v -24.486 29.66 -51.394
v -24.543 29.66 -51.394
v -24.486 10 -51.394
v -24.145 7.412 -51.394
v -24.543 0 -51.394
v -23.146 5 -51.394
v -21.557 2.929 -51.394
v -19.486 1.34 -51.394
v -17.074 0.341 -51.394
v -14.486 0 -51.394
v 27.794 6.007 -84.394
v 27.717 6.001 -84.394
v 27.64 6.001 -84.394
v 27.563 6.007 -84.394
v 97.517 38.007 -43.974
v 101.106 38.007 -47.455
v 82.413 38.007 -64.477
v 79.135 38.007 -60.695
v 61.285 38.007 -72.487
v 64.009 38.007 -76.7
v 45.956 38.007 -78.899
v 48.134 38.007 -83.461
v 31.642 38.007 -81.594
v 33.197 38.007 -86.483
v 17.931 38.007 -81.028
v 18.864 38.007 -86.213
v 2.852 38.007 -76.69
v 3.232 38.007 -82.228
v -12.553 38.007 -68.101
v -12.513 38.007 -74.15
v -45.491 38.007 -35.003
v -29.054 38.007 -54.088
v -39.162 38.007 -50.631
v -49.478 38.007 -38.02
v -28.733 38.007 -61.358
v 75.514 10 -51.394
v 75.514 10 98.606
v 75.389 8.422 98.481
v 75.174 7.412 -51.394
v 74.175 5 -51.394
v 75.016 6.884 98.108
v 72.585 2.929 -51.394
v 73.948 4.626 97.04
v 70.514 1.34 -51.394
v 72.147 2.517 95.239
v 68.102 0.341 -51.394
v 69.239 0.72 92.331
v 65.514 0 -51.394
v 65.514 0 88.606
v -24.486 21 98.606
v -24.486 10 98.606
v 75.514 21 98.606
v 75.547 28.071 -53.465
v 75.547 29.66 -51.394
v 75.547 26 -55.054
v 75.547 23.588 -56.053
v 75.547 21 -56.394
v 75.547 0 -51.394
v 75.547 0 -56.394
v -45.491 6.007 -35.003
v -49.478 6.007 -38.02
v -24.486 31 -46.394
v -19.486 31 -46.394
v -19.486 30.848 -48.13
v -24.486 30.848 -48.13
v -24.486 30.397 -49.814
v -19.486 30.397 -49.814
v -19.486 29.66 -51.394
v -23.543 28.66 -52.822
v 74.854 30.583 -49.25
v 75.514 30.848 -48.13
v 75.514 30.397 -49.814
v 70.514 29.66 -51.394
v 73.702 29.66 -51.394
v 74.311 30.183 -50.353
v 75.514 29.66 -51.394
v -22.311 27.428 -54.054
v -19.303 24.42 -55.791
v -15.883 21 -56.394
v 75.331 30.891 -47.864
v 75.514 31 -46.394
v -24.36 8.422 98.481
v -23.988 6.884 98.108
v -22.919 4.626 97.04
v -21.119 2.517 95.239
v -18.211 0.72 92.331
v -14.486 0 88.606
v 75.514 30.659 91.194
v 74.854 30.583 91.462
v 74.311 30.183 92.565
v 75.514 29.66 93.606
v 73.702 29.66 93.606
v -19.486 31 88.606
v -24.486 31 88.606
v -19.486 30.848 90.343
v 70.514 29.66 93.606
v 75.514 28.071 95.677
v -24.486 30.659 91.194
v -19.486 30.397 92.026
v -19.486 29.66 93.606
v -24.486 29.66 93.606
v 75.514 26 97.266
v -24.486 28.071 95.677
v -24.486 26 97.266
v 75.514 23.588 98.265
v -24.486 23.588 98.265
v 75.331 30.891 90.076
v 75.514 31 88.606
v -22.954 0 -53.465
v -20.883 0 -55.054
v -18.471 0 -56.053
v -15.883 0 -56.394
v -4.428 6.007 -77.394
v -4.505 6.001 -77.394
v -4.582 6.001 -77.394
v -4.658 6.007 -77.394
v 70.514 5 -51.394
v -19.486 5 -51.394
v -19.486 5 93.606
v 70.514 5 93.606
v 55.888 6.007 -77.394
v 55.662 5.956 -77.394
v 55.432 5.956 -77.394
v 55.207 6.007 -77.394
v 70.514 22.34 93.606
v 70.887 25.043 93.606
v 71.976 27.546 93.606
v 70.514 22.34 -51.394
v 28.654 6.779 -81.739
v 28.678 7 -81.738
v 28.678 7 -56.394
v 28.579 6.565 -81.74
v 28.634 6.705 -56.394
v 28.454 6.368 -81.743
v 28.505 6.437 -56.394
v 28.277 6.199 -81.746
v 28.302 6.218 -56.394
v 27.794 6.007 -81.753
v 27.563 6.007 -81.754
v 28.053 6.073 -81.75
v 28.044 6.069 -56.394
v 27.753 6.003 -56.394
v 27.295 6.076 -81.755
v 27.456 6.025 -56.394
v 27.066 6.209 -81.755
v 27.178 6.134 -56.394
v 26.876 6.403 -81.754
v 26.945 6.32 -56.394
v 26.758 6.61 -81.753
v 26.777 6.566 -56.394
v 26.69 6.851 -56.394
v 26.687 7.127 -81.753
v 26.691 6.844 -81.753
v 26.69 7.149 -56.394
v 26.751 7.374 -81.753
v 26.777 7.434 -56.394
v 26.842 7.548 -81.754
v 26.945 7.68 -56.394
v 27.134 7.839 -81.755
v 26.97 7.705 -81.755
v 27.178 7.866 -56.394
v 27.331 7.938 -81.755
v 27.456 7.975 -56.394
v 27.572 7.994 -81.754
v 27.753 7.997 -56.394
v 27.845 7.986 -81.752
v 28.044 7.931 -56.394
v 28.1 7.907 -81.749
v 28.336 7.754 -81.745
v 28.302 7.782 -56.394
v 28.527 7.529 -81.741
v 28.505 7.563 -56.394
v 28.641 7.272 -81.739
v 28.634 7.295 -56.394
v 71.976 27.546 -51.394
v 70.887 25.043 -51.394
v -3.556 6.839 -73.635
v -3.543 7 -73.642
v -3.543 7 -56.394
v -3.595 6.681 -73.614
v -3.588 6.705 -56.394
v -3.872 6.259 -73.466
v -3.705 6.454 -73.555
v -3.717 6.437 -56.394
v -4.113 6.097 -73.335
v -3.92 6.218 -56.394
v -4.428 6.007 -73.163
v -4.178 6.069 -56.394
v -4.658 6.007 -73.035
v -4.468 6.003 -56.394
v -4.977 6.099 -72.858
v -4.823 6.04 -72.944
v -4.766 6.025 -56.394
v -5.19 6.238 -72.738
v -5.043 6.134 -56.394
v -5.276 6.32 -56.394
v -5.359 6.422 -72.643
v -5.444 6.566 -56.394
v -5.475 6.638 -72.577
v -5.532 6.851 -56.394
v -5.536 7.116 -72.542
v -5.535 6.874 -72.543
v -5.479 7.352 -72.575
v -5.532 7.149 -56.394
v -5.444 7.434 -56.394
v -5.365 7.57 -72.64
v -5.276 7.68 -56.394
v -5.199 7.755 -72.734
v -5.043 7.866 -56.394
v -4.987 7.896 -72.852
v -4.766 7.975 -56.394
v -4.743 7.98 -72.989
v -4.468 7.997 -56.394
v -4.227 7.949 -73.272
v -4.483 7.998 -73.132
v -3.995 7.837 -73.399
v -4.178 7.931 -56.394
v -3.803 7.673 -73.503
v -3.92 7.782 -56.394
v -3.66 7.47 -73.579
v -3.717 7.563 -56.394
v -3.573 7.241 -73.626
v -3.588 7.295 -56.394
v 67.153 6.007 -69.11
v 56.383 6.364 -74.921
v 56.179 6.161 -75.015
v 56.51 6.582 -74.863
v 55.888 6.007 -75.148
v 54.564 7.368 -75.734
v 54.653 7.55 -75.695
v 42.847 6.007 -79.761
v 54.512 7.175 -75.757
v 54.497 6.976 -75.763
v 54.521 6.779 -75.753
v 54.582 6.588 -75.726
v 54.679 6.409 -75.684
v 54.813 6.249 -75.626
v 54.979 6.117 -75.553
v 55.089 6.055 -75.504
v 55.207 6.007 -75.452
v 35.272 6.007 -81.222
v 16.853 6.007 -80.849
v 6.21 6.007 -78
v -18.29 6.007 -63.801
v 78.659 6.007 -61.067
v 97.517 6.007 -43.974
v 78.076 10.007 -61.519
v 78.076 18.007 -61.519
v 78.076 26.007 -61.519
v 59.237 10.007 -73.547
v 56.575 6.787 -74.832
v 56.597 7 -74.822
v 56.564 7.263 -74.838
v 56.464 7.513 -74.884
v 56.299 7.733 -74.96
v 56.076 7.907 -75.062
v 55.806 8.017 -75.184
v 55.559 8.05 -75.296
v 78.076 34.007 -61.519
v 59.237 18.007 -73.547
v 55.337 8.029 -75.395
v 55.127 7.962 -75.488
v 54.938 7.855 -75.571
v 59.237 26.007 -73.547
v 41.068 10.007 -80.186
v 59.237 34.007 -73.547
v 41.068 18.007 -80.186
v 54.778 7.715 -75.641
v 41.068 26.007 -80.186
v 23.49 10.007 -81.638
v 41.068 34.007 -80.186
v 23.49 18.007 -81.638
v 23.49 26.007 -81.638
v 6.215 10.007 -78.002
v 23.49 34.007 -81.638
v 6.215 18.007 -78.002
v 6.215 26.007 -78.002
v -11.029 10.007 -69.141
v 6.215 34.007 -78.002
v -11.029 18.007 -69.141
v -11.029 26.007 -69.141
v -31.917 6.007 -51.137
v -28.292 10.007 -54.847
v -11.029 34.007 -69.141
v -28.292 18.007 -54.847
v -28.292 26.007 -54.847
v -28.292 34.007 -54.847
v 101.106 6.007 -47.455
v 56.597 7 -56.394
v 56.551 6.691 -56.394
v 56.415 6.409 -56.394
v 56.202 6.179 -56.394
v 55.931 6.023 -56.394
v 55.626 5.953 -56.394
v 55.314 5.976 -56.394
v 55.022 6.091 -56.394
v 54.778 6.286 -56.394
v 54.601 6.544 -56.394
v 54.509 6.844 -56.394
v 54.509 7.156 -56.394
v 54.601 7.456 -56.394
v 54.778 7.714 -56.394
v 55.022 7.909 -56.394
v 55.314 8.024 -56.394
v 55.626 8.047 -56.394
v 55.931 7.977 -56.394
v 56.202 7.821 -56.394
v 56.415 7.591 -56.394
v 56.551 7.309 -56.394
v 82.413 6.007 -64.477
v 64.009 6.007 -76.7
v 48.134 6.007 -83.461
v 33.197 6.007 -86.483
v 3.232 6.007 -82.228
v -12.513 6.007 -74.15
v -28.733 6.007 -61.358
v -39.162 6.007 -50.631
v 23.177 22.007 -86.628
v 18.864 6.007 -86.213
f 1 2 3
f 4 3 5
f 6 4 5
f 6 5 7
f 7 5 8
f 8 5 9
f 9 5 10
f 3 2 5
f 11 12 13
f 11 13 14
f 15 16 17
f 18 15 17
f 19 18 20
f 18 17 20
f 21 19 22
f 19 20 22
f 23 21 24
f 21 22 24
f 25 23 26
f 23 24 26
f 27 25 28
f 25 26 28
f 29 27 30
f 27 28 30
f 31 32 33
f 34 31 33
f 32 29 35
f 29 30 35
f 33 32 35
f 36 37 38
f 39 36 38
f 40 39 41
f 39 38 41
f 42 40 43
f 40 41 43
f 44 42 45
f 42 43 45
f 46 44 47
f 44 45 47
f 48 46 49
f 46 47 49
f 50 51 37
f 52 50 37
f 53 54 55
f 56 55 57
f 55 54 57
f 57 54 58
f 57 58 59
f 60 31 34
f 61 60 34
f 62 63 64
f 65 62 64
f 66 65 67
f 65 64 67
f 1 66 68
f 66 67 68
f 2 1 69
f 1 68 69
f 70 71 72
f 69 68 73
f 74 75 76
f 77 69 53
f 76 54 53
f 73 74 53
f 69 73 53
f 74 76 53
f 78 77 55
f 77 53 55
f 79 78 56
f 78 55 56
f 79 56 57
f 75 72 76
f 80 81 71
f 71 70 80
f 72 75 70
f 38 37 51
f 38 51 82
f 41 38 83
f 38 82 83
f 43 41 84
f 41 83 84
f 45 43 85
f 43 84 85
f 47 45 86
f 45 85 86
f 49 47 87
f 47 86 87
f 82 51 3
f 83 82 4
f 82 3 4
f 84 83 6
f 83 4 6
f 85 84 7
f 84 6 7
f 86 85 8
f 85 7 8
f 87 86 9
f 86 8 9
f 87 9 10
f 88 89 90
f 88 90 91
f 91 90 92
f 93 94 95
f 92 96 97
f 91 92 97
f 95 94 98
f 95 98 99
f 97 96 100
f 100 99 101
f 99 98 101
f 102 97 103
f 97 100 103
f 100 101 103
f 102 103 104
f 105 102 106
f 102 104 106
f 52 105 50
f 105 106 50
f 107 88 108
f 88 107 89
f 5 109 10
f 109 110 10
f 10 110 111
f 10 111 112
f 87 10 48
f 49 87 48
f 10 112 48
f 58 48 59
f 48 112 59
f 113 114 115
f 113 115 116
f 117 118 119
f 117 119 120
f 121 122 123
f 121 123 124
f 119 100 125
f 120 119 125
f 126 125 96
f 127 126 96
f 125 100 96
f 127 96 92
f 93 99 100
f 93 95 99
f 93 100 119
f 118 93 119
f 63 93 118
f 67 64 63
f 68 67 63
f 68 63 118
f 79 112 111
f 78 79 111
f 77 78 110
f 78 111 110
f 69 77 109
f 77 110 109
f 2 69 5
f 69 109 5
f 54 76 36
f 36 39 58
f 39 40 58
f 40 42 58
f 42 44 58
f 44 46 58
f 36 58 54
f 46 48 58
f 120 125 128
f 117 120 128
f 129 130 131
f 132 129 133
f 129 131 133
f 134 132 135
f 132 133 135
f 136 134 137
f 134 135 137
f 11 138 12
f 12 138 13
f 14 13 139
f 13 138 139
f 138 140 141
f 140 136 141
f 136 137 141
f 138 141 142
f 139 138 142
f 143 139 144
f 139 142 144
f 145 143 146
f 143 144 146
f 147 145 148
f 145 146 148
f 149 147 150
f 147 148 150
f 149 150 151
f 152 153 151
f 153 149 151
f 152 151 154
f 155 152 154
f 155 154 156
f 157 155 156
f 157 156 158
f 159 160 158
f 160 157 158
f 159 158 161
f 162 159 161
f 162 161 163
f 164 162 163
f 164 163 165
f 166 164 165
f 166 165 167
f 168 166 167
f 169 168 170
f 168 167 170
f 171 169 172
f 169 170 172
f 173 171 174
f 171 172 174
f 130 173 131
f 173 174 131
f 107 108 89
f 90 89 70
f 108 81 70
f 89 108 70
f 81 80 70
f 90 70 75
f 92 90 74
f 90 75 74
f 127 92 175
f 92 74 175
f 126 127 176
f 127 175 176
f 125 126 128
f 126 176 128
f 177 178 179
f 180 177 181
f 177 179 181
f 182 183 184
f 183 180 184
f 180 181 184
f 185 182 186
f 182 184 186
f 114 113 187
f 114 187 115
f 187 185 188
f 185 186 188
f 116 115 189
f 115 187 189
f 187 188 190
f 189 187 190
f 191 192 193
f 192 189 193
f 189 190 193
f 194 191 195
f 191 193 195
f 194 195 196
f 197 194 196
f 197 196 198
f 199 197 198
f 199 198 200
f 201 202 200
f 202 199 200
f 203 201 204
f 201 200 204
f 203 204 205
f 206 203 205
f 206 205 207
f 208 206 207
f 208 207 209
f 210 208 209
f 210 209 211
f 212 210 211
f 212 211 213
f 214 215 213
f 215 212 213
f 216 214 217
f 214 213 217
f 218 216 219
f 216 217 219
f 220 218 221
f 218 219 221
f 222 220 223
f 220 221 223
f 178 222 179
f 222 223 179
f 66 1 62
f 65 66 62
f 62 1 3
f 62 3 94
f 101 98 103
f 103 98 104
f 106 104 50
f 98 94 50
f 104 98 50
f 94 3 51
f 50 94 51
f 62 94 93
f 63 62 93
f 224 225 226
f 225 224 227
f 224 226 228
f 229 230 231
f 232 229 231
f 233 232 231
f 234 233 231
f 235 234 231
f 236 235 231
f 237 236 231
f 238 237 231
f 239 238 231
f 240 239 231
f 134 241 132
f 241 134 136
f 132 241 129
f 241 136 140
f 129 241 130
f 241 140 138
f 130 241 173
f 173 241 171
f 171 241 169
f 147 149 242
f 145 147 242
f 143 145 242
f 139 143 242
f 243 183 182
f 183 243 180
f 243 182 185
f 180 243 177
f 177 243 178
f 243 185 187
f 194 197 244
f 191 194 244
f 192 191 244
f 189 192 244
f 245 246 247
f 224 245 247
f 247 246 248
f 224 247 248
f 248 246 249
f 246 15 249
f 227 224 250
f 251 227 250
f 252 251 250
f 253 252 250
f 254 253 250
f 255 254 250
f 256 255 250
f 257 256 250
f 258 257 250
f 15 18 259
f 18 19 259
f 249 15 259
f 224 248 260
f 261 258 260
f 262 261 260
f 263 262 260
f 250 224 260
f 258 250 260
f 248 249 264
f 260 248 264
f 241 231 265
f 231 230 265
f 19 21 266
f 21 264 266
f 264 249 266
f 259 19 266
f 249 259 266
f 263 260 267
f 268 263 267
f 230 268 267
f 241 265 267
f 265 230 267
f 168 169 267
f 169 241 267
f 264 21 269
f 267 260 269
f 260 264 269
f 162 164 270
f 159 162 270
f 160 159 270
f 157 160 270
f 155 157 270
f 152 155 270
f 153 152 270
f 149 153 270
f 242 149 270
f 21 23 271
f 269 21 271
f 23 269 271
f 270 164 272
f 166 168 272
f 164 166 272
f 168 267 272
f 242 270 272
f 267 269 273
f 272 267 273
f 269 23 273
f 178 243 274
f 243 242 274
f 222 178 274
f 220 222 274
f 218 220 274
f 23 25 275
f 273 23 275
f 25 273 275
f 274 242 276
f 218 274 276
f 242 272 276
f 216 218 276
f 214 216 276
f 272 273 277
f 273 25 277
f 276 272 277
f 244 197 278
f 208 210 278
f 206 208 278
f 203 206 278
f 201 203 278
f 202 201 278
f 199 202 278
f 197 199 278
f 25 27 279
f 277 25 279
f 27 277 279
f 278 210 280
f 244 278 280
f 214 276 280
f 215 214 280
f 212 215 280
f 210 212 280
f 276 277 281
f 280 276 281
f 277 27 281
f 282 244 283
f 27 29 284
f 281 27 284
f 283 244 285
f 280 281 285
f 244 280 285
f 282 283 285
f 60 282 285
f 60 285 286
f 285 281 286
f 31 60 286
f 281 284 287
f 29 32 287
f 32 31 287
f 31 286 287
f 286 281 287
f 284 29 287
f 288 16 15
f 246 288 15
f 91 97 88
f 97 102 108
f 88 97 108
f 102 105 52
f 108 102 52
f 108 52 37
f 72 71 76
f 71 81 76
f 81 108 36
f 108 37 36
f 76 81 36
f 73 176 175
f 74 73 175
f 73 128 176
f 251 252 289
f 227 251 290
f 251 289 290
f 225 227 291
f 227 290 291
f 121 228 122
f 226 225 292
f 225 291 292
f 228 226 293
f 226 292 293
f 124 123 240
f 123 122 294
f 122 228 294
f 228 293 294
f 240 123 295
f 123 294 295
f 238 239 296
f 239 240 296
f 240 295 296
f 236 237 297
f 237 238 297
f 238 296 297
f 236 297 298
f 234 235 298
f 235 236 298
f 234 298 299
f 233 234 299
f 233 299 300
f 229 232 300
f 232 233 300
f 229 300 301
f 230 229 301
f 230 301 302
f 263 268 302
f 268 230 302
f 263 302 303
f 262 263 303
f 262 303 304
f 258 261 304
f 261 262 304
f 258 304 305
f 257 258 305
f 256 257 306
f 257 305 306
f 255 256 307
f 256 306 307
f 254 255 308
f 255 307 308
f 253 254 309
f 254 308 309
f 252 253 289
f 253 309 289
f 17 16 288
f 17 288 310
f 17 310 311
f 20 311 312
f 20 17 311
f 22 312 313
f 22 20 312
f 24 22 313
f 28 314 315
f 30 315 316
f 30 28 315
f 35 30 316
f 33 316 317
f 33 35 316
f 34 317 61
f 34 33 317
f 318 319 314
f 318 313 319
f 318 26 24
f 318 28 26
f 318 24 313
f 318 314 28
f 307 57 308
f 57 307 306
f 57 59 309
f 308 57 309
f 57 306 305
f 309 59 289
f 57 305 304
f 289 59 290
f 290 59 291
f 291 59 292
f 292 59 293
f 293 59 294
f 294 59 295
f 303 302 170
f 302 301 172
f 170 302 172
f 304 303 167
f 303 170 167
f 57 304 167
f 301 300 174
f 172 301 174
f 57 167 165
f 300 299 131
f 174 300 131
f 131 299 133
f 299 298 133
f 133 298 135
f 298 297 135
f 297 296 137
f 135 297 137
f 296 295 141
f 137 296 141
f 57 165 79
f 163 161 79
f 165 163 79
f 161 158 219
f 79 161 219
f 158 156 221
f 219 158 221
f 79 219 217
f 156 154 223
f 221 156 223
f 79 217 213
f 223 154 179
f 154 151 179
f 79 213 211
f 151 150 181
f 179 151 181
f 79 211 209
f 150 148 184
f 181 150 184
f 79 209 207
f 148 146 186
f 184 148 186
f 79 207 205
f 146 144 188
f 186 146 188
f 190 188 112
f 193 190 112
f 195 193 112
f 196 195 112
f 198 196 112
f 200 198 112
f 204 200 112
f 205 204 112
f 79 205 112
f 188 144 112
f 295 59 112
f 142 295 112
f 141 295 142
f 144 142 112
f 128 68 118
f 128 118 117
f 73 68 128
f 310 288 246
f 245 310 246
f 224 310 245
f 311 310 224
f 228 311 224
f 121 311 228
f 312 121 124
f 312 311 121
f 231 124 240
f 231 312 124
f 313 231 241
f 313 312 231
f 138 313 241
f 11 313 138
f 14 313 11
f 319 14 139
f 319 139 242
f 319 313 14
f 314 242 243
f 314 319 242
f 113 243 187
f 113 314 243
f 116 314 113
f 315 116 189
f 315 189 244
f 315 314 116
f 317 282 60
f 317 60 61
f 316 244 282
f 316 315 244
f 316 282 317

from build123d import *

# Parameters (mm, degrees)
BOSS_EXTRUDE1_DEPTH = 31
SKETCH5_W           = 90
SKETCH5_H           = 144.999999519
CUT_EXTRUDE2_DEPTH  = 26
SKETCH10_R          = 1.05
SKETCH10_R_2        = 1
BOSS_EXTRUDE3_DEPTH = 21
EXTRUDE_THIN2_START = -32
EXTRUDE_THIN2_DEPTH = 32
FILLET2_R           = 10
FILLET4_R           = 10
FILLET5_R           = 10
FILLET6_R           = 10
SKETCH15_R          = 1
BOSS_EXTRUDE4_DEPTH = 28


# Read off the part's stored shape, not the designer's step: Extrude-Thin2
with BuildPart() as part:
    # Sketch4 → Boss-Extrude1 (new body)
    with BuildSketch(Plane(origin=(0, 0, 0), x_dir=(1, 0, 0), z_dir=(0, 1, 0))):
        Polygon((-24.543123589, 51.393890829), (-24.485724986, 51.393890829), (-24.485724986, -98.606109173), (75.514275014, -98.606109173), (75.514275014, 51.393890827), (75.547211032, 51.393890827), (75.547211032, 56.393890829), (-24.543123589, 56.393890829), align=None)
    extrude(amount=BOSS_EXTRUDE1_DEPTH)

    # Sketch5 → Cut-Extrude2 (cut)
    with BuildSketch(Plane(origin=(0, 31, 0), x_dir=(1, 0, 0), z_dir=(0, 1, 0))):
        with Locations((25.514275014, -21.106109414)):
            Rectangle(SKETCH5_W, SKETCH5_H)
    extrude(amount=-CUT_EXTRUDE2_DEPTH, mode=Mode.SUBTRACT)

    # Sketch10 → Boss-Extrude3 (add)
    with BuildSketch(Plane(origin=(0, 0, -56.393890829), x_dir=(-1, 0, 0), z_dir=(0, 0, -1))):
        with Locations(Location((-55.547211032, 7, 0), (0, 0, 180))):
            Circle(SKETCH10_R)
        with Locations(Location((4.543123589, 7, 0), (0, 0, 180))):
            Circle(SKETCH10_R_2)
    extrude(amount=BOSS_EXTRUDE3_DEPTH)

    # Fillet2
    # the kernel refuses this fillet: 10 mm, written as the material it takes off along each edge
    with BuildSketch(Plane(origin=(-49.485724986, 31, 98.606109173), x_dir=(0, 0, -1), z_dir=(1, 0, 0))) as fillet2_piece_1:
        with BuildLine():
            CenterArc((FILLET2_R, -FILLET2_R), FILLET2_R, 90, 90)
            Line((0, -FILLET2_R), (0, 0))
            Line((0, 0), (FILLET2_R, 0))
        make_face()
    extrude(amount=150, mode=Mode.SUBTRACT)
    with BuildSketch(Plane(origin=(-24.485724986, 0, -51.393890829), x_dir=(0, 1, 0), z_dir=(0, 0, 1))) as fillet2_piece_2:
        with BuildLine():
            CenterArc((FILLET2_R, -FILLET2_R), FILLET2_R, 90, 90)
            Line((0, -FILLET2_R), (0, 0))
            Line((0, 0), (FILLET2_R, 0))
        make_face()
    extrude(amount=175.000000002, mode=Mode.SUBTRACT)
    with BuildSketch(Plane(origin=(-49.485724986, 0, 98.606109173), x_dir=(0, 0, -1), z_dir=(1, 0, 0))) as fillet2_piece_3:
        with BuildLine():
            CenterArc((FILLET2_R, FILLET2_R), FILLET2_R, 180, 90)
            Line((0, FILLET2_R), (0, 0))
            Line((0, 0), (FILLET2_R, 0))
        make_face()
    extrude(amount=150, mode=Mode.SUBTRACT)
    with BuildSketch(Plane(origin=(75.514275014, 0, 123.606109173), x_dir=(-1, 0, 0), z_dir=(0, 0, -1))) as fillet2_piece_4:
        with BuildLine():
            CenterArc((FILLET2_R, FILLET2_R), FILLET2_R, 180, 90)
            Line((0, FILLET2_R), (0, 0))
            Line((0, 0), (FILLET2_R, 0))
        make_face()
    extrude(amount=175, mode=Mode.SUBTRACT)

    # Fillet4
    # the kernel refuses this fillet: 10 mm, written as the material it takes off along each edge
    with BuildSketch(Plane(origin=(70.514275014, 31, -73.044525441), x_dir=(0, -1, 0), z_dir=(0, 0, 1))) as fillet4_piece_1_section:
        with BuildLine():
            CenterArc((8.660254038, 10), FILLET4_R, 210, 60)
            Line((0, 5), (0, 0))
            Line((0, 0), (8.660254038, 0))
        make_face()
    fillet4_piece_1 = extrude(amount=183.301269709, mode=Mode.PRIVATE)
    fillet4_piece_1 = split(fillet4_piece_1, bisect_by=Plane(origin=(71.836700468, 27.349745962, -51.393890827), z_dir=(0, 0, 1)), keep=Keep.TOP, mode=Mode.PRIVATE)
    fillet4_piece_1 = split(fillet4_piece_1, bisect_by=Plane(origin=(71.836700468, 27.349745962, 93.606109173), z_dir=(0, 0, -1)), keep=Keep.TOP, mode=Mode.PRIVATE)
    add(fillet4_piece_1, mode=Mode.SUBTRACT)

    # Fillet5
    # the kernel refuses this fillet: 10 mm, written as the material it takes off along each edge
    with BuildSketch(Plane(origin=(100.547211032, 31, -56.393890829), x_dir=(0, -1, 0), z_dir=(-1, 0, 0))) as fillet5_piece_1:
        with BuildLine():
            CenterArc((FILLET5_R, FILLET5_R), FILLET5_R, 180, 90)
            Line((0, FILLET5_R), (0, 0))
            Line((0, 0), (FILLET5_R, 0))
        make_face()
    extrude(amount=150.090334621, mode=Mode.SUBTRACT)

    # Fillet6
    # the kernel refuses this fillet: 10 mm, written as the material it takes off along each edge
    with BuildSketch(Plane(origin=(-24.543123589, -21.650635095, -56.393890829), x_dir=(0, 0, 1), z_dir=(0, 1, 0))) as fillet6_piece_1:
        with BuildLine():
            CenterArc((10, 8.660254038), FILLET6_R, 180, 60)
            Line((0, 8.660254038), (-0.2, 8.660254038))
            Line((-0.2, 8.660254038), (-0.2, 0))
            Line((-0.2, 0), (0, -0.2))
            ThreePointArc((0, -0.2), (2.5, -0.2), (4.9, -0.173205081))
            Line((4.9, -0.173205081), (5, 0))
        make_face()
    extrude(amount=64.301270189, mode=Mode.SUBTRACT)



with BuildPart() as body_2:
    # Extrude-Thin2 outline → Extrude-Thin2 (new body)
    with BuildSketch(Plane(origin=(0, 6.00667288, 0), x_dir=(-1, 0, 0), z_dir=(0, -1, 0)).offset(EXTRUDE_THIN2_START)):
        with BuildLine():
            Line((-101.106259616, 47.455416484), (-97.517183312, 43.974248393))
            add(Edge.make_bspline(
                [(-97.517183312, 43.974248393), (-90.947109033, 50.747979881), (-84.461523265, 56.594117718), (-71.690746068, 66.443323609), (-65.406461275, 70.445777381), (-53.067617331, 76.648178617), (-47.015104027, 78.848903051), (-35.121450693, 81.523458331), (-29.279693001, 82.000658953), (-17.700514878, 81.275147368), (-11.958520381, 80.072104414), (-0.470729692, 75.931508258), (5.275181576, 72.990557795), (16.783088845, 65.291546287), (22.542970532, 60.533005936), (34.041987864, 49.160363108), (39.780319498, 42.546980543), (45.491234369, 35.002570947)],
                knots=[0, 0, 0, 0, 0.125, 0.125, 0.25, 0.25, 0.375, 0.375, 0.5, 0.5, 0.625, 0.625, 0.75, 0.75, 0.875, 0.875, 1, 1, 1, 1], degree=3))
            Line((45.491234369, 35.002570947), (49.477851308, 38.020332599))
            add(Edge.make_bspline(
                [(-101.106259616, 47.455416484), (-20.540664315, 130.518360158), (49.477851308, 38.020332599)],
                knots=[0, 0, 0, 1, 1, 1], degree=2))
        make_face()
    extrude(amount=EXTRUDE_THIN2_DEPTH)


with BuildPart() as part_1:
    add(part.part)

    add(body_2.part)  # Boss-Extrude4 merges body 2
    # Sketch15 → Boss-Extrude4 (add)
    with BuildSketch(Plane(origin=(0, 0, -56.393890829), x_dir=(-1, 0, 0), z_dir=(0, 0, -1))):
        with Locations(Location((-27.678413699, 7, 0), (0, 0, 180))):
            Circle(SKETCH15_R)
    extrude(amount=BOSS_EXTRUDE4_DEPTH)


solid = part_1.part
